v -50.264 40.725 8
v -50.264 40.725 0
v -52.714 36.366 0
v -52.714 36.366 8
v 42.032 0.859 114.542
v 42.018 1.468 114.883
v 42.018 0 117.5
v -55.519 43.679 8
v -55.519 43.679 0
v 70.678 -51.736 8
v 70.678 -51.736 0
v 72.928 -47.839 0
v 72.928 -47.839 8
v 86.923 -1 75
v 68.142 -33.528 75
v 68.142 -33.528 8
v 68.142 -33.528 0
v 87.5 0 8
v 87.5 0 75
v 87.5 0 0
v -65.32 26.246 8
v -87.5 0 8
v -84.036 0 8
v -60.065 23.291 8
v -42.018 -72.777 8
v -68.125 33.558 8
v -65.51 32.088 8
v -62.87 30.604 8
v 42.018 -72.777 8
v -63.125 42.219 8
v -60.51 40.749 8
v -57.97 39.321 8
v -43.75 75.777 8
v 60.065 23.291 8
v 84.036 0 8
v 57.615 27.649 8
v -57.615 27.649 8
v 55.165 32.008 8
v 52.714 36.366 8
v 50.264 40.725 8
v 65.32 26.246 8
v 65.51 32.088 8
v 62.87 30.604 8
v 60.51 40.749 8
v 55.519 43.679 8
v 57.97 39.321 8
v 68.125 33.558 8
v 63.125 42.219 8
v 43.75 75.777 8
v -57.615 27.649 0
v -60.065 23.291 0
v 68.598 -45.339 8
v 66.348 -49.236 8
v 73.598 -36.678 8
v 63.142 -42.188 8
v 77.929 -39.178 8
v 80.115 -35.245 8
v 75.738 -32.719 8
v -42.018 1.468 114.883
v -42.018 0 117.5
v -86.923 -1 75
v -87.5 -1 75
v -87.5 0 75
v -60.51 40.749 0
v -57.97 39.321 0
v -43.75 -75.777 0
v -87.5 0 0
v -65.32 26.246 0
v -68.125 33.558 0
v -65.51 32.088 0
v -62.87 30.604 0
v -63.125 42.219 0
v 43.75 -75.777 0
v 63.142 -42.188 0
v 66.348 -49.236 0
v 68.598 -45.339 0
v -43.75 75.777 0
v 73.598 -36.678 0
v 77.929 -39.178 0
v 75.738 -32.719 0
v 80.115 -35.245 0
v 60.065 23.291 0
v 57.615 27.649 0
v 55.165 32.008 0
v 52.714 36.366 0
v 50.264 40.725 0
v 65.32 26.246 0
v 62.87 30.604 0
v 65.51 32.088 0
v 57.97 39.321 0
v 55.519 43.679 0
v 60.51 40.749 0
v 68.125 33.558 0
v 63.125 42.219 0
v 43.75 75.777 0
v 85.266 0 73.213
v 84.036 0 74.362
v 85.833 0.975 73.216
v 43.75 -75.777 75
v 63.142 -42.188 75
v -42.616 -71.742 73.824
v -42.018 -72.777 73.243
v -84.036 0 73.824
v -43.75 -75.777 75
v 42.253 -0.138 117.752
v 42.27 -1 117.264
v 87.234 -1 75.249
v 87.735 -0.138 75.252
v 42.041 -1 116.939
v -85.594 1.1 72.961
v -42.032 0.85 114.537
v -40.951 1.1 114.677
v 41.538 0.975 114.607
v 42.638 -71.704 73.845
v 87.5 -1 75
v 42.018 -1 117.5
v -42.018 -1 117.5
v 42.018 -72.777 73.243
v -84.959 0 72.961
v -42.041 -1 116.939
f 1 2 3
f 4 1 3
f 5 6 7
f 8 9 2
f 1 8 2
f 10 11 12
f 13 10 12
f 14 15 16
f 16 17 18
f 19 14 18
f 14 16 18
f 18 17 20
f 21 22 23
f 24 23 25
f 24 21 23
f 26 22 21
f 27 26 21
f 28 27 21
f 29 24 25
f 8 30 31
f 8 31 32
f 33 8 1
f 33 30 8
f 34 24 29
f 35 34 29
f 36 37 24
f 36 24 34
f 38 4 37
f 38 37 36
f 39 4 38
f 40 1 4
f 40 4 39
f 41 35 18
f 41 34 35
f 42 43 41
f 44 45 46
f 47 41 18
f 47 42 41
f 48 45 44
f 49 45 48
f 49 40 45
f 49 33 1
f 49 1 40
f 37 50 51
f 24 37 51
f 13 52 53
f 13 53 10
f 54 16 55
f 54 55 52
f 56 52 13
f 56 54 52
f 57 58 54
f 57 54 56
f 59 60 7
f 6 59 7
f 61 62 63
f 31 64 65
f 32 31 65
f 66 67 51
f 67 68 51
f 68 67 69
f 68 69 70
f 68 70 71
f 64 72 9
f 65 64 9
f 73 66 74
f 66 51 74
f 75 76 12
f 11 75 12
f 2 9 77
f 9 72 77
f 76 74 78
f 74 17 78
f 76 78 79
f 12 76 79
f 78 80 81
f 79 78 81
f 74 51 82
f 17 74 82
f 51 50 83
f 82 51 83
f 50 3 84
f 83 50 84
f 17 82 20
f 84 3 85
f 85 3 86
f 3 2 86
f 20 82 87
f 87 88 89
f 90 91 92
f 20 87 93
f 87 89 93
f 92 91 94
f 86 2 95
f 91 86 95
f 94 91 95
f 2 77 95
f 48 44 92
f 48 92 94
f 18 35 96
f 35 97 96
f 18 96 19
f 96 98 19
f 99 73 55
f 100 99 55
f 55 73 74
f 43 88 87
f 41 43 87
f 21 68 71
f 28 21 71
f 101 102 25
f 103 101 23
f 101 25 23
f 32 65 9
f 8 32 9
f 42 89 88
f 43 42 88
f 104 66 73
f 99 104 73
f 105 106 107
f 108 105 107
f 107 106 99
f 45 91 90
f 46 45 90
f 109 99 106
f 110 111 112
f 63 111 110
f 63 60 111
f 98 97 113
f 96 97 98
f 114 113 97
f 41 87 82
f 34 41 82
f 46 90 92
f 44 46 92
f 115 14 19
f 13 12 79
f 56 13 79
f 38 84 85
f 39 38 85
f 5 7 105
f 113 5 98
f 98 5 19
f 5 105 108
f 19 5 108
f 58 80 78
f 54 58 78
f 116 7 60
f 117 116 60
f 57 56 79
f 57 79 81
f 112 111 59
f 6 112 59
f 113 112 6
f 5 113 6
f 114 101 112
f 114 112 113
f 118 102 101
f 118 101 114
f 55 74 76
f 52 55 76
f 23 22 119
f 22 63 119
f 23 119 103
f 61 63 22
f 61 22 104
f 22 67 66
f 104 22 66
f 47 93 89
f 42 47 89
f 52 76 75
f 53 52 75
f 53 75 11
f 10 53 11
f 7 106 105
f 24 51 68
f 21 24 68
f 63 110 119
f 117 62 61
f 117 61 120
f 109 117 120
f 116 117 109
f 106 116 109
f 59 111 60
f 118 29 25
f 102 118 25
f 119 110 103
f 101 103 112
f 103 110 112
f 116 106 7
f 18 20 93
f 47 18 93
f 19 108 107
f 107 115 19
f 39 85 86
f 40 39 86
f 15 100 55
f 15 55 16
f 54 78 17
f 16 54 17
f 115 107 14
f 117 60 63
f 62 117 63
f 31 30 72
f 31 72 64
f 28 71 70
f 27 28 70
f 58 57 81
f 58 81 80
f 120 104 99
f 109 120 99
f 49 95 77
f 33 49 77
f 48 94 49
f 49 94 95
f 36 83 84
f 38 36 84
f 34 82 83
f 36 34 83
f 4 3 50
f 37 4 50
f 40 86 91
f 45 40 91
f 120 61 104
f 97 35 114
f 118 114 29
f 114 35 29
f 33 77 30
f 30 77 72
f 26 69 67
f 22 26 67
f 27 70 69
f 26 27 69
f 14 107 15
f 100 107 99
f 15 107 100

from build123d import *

# Parameters (mm, degrees)
F0_W      = 50
F0_H      = 12.5
F1_DEPTH  = 8
F2_DEPTH  = 75
F4_DEPTH  = 8
F7_DEPTH  = 3
F8_DEPTH  = 1
F11_DEPTH = 3
F14_DEPTH = 3
F15_DEPTH = 8
F16_DEPTH = 8
F17_DEPTH = 8
F18_DEPTH = 8


# Not quite as in the source:
# - a feature names something its author has since deleted; it is built from what else it names


with BuildPart() as f1:
    # F0 (on Top) → F1 (new body)
    with BuildSketch(Plane.XY):
        Polygon((-42.0179491924, 72.7772228311), (-60.5095952989, 40.7487522591), (-57.9695070384, 39.3207329262), (-55.5194165334, 43.6791064608), (-50.2642610162, 40.7248836223), (-52.7144317239, 36.366367418), (-57.615009792, 27.6494680496), (-60.0654171506, 23.2910848888), (-65.3204122546, 26.2455930623), (-62.870004896, 30.6039762231), (-65.5097997054, 32.0881441788), (-84.0358983849, 0), (-42.0179491924, -72.7772228311), (42.0179491924, -72.7772228311), (84.0358983849, 0), (65.5097997054, 32.0881441788), (62.870004896, 30.6039762231), (65.3204122546, 26.2455930623), (60.0654171506, 23.2910848888), (57.615009792, 27.6494680496), (55.164720758, 32.0079177338), (52.7144317239, 36.366367418), (50.2642610162, 40.7248836223), (55.5194165334, 43.6791064608), (57.9695070384, 39.3207329262), (60.5095952989, 40.7487522591), (42.0179491924, 72.7772228311), align=None)
        with Locations((0, 54.5829171234)):
            Rectangle(F0_W, F0_H, mode=Mode.SUBTRACT)
    extrude(amount=F1_DEPTH)

    # F0 (on Top) → F2 (join)
    with BuildSketch(Plane.XY):
        Polygon((68.1424599038, -33.5282429562), (87.5, 0), (84.0358983849, 0), (42.0179491924, -72.7772228311), (-42.0179491924, -72.7772228311), (-84.0358983849, 0), (-87.5, 0), (-43.75, -75.7772228311), (43.75, -75.7772228311), (63.1424599038, -42.188496994), align=None)
    extrude(amount=F2_DEPTH)

    # F0 (on Top) → F4 (join)
    with BuildSketch(Plane.XY):
        Polygon((43.75, 75.7772228311), (-43.75, 75.7772228311), (-63.1248363216, 42.2190219338), (-60.5095952989, 40.7487522591), (-42.0179491924, 72.7772228311), (42.0179491924, 72.7772228311), (60.5095952989, 40.7487522591), (63.1248363216, 42.2190219338), align=None)
    extrude(amount=F4_DEPTH)

    # F6 (on face) → F7 (join)
    with BuildSketch(Plane(origin=(0, -50.1312366318, 89.3836679776), x_dir=(1, 0, 0), z_dir=(0, 0.4891706574, -0.872188092))):
        Polygon((43.75, 29.4041920927), (0, 29.4041920927), (-43.75, 29.4041920927), (-42.01795, -57.4775522498), (42.01795, -57.4775522498), align=None)
    extrude(amount=F7_DEPTH)

    # F3 (on Front) → F8 (join)
    with BuildSketch(Plane.XZ):
        Polygon((-42.01795, 114.5), (0, 114.5), (42.01795, 114.5), (84.0359, 75), (87.5, 75), (42.01795, 117.5), (0, 117.5), (-42.01795, 117.5), (-87.5, 75), (-84.0359, 75), align=None)
    extrude(amount=F8_DEPTH)

    # F10 (on face) → F11 (join)
    with BuildSketch(Plane(origin=(-67.6846727043, -39.0777640058, 72.4338274863), x_dir=(0.7723629594, -0.3015876344, 0.5590173143), z_dir=(-0.6351814378, -0.3667221741, 0.6797495039))):
        Polygon((33.2314262259, 55.789645187), (-25.6554603702, 35.6104118215), (30.9888924807, -31.0804218073), align=None)
    extrude(amount=-F11_DEPTH)

    # F13 (on face) → F14 (join)
    with BuildSketch(Plane(origin=(67.6756688636, -39.5950852503, 72.4241918832), x_dir=(0.7733047167, 0.3041472681, -0.556322078), z_dir=(-0.6340345536, 0.3709553614, -0.6785221475))):
        Polygon((-30.939509805, 30.5117392321), (-32.8751652468, -56.3649154418), (25.9400068576, -35.9776056011), align=None)
    extrude(amount=F14_DEPTH)

    # F0 (on Top) → F15 (join)
    with BuildSketch(Plane.XY):
        with Locations((0, 54.5829171234)):
            Rectangle(F0_W, F0_H)
    extrude(amount=F15_DEPTH)

    # F0 (on Top) → F16 (join)
    with BuildSketch(Plane.XY):
        Polygon((75.7376143812, -32.7192219692), (73.5984199476, -36.6782429562), (77.9285469666, -39.1782429562), (80.1153549422, -35.2453215385), align=None)
        Polygon((73.5984199476, -36.6782429562), (68.1424599038, -33.5282429562), (63.1424599038, -42.188496994), (68.5982950526, -45.3387133087), (72.9283229484, -47.838884987), (77.9285469666, -39.1782429562), align=None)
        Polygon((72.9283229484, -47.838884987), (68.5982950526, -45.3387133087), (66.3481405421, -49.235738415), (70.6781684379, -51.7359100933), align=None)
    extrude(amount=F16_DEPTH)

    # F0 (on Top) → F17 (join)
    with BuildSketch(Plane.XY):
        Polygon((-65.5097997054, 32.0881441788), (-68.125, 33.5584843966), (-87.5, 0), (-84.0358983849, 0), align=None)
    extrude(amount=F17_DEPTH)

    # F0 (on Top) → F18 (join)
    with BuildSketch(Plane.XY):
        Polygon((87.5, 0), (68.125, 33.5584843966), (65.5097997054, 32.0881441788), (84.0358983849, 0), align=None)
    extrude(amount=F18_DEPTH)


solid = f1.part
